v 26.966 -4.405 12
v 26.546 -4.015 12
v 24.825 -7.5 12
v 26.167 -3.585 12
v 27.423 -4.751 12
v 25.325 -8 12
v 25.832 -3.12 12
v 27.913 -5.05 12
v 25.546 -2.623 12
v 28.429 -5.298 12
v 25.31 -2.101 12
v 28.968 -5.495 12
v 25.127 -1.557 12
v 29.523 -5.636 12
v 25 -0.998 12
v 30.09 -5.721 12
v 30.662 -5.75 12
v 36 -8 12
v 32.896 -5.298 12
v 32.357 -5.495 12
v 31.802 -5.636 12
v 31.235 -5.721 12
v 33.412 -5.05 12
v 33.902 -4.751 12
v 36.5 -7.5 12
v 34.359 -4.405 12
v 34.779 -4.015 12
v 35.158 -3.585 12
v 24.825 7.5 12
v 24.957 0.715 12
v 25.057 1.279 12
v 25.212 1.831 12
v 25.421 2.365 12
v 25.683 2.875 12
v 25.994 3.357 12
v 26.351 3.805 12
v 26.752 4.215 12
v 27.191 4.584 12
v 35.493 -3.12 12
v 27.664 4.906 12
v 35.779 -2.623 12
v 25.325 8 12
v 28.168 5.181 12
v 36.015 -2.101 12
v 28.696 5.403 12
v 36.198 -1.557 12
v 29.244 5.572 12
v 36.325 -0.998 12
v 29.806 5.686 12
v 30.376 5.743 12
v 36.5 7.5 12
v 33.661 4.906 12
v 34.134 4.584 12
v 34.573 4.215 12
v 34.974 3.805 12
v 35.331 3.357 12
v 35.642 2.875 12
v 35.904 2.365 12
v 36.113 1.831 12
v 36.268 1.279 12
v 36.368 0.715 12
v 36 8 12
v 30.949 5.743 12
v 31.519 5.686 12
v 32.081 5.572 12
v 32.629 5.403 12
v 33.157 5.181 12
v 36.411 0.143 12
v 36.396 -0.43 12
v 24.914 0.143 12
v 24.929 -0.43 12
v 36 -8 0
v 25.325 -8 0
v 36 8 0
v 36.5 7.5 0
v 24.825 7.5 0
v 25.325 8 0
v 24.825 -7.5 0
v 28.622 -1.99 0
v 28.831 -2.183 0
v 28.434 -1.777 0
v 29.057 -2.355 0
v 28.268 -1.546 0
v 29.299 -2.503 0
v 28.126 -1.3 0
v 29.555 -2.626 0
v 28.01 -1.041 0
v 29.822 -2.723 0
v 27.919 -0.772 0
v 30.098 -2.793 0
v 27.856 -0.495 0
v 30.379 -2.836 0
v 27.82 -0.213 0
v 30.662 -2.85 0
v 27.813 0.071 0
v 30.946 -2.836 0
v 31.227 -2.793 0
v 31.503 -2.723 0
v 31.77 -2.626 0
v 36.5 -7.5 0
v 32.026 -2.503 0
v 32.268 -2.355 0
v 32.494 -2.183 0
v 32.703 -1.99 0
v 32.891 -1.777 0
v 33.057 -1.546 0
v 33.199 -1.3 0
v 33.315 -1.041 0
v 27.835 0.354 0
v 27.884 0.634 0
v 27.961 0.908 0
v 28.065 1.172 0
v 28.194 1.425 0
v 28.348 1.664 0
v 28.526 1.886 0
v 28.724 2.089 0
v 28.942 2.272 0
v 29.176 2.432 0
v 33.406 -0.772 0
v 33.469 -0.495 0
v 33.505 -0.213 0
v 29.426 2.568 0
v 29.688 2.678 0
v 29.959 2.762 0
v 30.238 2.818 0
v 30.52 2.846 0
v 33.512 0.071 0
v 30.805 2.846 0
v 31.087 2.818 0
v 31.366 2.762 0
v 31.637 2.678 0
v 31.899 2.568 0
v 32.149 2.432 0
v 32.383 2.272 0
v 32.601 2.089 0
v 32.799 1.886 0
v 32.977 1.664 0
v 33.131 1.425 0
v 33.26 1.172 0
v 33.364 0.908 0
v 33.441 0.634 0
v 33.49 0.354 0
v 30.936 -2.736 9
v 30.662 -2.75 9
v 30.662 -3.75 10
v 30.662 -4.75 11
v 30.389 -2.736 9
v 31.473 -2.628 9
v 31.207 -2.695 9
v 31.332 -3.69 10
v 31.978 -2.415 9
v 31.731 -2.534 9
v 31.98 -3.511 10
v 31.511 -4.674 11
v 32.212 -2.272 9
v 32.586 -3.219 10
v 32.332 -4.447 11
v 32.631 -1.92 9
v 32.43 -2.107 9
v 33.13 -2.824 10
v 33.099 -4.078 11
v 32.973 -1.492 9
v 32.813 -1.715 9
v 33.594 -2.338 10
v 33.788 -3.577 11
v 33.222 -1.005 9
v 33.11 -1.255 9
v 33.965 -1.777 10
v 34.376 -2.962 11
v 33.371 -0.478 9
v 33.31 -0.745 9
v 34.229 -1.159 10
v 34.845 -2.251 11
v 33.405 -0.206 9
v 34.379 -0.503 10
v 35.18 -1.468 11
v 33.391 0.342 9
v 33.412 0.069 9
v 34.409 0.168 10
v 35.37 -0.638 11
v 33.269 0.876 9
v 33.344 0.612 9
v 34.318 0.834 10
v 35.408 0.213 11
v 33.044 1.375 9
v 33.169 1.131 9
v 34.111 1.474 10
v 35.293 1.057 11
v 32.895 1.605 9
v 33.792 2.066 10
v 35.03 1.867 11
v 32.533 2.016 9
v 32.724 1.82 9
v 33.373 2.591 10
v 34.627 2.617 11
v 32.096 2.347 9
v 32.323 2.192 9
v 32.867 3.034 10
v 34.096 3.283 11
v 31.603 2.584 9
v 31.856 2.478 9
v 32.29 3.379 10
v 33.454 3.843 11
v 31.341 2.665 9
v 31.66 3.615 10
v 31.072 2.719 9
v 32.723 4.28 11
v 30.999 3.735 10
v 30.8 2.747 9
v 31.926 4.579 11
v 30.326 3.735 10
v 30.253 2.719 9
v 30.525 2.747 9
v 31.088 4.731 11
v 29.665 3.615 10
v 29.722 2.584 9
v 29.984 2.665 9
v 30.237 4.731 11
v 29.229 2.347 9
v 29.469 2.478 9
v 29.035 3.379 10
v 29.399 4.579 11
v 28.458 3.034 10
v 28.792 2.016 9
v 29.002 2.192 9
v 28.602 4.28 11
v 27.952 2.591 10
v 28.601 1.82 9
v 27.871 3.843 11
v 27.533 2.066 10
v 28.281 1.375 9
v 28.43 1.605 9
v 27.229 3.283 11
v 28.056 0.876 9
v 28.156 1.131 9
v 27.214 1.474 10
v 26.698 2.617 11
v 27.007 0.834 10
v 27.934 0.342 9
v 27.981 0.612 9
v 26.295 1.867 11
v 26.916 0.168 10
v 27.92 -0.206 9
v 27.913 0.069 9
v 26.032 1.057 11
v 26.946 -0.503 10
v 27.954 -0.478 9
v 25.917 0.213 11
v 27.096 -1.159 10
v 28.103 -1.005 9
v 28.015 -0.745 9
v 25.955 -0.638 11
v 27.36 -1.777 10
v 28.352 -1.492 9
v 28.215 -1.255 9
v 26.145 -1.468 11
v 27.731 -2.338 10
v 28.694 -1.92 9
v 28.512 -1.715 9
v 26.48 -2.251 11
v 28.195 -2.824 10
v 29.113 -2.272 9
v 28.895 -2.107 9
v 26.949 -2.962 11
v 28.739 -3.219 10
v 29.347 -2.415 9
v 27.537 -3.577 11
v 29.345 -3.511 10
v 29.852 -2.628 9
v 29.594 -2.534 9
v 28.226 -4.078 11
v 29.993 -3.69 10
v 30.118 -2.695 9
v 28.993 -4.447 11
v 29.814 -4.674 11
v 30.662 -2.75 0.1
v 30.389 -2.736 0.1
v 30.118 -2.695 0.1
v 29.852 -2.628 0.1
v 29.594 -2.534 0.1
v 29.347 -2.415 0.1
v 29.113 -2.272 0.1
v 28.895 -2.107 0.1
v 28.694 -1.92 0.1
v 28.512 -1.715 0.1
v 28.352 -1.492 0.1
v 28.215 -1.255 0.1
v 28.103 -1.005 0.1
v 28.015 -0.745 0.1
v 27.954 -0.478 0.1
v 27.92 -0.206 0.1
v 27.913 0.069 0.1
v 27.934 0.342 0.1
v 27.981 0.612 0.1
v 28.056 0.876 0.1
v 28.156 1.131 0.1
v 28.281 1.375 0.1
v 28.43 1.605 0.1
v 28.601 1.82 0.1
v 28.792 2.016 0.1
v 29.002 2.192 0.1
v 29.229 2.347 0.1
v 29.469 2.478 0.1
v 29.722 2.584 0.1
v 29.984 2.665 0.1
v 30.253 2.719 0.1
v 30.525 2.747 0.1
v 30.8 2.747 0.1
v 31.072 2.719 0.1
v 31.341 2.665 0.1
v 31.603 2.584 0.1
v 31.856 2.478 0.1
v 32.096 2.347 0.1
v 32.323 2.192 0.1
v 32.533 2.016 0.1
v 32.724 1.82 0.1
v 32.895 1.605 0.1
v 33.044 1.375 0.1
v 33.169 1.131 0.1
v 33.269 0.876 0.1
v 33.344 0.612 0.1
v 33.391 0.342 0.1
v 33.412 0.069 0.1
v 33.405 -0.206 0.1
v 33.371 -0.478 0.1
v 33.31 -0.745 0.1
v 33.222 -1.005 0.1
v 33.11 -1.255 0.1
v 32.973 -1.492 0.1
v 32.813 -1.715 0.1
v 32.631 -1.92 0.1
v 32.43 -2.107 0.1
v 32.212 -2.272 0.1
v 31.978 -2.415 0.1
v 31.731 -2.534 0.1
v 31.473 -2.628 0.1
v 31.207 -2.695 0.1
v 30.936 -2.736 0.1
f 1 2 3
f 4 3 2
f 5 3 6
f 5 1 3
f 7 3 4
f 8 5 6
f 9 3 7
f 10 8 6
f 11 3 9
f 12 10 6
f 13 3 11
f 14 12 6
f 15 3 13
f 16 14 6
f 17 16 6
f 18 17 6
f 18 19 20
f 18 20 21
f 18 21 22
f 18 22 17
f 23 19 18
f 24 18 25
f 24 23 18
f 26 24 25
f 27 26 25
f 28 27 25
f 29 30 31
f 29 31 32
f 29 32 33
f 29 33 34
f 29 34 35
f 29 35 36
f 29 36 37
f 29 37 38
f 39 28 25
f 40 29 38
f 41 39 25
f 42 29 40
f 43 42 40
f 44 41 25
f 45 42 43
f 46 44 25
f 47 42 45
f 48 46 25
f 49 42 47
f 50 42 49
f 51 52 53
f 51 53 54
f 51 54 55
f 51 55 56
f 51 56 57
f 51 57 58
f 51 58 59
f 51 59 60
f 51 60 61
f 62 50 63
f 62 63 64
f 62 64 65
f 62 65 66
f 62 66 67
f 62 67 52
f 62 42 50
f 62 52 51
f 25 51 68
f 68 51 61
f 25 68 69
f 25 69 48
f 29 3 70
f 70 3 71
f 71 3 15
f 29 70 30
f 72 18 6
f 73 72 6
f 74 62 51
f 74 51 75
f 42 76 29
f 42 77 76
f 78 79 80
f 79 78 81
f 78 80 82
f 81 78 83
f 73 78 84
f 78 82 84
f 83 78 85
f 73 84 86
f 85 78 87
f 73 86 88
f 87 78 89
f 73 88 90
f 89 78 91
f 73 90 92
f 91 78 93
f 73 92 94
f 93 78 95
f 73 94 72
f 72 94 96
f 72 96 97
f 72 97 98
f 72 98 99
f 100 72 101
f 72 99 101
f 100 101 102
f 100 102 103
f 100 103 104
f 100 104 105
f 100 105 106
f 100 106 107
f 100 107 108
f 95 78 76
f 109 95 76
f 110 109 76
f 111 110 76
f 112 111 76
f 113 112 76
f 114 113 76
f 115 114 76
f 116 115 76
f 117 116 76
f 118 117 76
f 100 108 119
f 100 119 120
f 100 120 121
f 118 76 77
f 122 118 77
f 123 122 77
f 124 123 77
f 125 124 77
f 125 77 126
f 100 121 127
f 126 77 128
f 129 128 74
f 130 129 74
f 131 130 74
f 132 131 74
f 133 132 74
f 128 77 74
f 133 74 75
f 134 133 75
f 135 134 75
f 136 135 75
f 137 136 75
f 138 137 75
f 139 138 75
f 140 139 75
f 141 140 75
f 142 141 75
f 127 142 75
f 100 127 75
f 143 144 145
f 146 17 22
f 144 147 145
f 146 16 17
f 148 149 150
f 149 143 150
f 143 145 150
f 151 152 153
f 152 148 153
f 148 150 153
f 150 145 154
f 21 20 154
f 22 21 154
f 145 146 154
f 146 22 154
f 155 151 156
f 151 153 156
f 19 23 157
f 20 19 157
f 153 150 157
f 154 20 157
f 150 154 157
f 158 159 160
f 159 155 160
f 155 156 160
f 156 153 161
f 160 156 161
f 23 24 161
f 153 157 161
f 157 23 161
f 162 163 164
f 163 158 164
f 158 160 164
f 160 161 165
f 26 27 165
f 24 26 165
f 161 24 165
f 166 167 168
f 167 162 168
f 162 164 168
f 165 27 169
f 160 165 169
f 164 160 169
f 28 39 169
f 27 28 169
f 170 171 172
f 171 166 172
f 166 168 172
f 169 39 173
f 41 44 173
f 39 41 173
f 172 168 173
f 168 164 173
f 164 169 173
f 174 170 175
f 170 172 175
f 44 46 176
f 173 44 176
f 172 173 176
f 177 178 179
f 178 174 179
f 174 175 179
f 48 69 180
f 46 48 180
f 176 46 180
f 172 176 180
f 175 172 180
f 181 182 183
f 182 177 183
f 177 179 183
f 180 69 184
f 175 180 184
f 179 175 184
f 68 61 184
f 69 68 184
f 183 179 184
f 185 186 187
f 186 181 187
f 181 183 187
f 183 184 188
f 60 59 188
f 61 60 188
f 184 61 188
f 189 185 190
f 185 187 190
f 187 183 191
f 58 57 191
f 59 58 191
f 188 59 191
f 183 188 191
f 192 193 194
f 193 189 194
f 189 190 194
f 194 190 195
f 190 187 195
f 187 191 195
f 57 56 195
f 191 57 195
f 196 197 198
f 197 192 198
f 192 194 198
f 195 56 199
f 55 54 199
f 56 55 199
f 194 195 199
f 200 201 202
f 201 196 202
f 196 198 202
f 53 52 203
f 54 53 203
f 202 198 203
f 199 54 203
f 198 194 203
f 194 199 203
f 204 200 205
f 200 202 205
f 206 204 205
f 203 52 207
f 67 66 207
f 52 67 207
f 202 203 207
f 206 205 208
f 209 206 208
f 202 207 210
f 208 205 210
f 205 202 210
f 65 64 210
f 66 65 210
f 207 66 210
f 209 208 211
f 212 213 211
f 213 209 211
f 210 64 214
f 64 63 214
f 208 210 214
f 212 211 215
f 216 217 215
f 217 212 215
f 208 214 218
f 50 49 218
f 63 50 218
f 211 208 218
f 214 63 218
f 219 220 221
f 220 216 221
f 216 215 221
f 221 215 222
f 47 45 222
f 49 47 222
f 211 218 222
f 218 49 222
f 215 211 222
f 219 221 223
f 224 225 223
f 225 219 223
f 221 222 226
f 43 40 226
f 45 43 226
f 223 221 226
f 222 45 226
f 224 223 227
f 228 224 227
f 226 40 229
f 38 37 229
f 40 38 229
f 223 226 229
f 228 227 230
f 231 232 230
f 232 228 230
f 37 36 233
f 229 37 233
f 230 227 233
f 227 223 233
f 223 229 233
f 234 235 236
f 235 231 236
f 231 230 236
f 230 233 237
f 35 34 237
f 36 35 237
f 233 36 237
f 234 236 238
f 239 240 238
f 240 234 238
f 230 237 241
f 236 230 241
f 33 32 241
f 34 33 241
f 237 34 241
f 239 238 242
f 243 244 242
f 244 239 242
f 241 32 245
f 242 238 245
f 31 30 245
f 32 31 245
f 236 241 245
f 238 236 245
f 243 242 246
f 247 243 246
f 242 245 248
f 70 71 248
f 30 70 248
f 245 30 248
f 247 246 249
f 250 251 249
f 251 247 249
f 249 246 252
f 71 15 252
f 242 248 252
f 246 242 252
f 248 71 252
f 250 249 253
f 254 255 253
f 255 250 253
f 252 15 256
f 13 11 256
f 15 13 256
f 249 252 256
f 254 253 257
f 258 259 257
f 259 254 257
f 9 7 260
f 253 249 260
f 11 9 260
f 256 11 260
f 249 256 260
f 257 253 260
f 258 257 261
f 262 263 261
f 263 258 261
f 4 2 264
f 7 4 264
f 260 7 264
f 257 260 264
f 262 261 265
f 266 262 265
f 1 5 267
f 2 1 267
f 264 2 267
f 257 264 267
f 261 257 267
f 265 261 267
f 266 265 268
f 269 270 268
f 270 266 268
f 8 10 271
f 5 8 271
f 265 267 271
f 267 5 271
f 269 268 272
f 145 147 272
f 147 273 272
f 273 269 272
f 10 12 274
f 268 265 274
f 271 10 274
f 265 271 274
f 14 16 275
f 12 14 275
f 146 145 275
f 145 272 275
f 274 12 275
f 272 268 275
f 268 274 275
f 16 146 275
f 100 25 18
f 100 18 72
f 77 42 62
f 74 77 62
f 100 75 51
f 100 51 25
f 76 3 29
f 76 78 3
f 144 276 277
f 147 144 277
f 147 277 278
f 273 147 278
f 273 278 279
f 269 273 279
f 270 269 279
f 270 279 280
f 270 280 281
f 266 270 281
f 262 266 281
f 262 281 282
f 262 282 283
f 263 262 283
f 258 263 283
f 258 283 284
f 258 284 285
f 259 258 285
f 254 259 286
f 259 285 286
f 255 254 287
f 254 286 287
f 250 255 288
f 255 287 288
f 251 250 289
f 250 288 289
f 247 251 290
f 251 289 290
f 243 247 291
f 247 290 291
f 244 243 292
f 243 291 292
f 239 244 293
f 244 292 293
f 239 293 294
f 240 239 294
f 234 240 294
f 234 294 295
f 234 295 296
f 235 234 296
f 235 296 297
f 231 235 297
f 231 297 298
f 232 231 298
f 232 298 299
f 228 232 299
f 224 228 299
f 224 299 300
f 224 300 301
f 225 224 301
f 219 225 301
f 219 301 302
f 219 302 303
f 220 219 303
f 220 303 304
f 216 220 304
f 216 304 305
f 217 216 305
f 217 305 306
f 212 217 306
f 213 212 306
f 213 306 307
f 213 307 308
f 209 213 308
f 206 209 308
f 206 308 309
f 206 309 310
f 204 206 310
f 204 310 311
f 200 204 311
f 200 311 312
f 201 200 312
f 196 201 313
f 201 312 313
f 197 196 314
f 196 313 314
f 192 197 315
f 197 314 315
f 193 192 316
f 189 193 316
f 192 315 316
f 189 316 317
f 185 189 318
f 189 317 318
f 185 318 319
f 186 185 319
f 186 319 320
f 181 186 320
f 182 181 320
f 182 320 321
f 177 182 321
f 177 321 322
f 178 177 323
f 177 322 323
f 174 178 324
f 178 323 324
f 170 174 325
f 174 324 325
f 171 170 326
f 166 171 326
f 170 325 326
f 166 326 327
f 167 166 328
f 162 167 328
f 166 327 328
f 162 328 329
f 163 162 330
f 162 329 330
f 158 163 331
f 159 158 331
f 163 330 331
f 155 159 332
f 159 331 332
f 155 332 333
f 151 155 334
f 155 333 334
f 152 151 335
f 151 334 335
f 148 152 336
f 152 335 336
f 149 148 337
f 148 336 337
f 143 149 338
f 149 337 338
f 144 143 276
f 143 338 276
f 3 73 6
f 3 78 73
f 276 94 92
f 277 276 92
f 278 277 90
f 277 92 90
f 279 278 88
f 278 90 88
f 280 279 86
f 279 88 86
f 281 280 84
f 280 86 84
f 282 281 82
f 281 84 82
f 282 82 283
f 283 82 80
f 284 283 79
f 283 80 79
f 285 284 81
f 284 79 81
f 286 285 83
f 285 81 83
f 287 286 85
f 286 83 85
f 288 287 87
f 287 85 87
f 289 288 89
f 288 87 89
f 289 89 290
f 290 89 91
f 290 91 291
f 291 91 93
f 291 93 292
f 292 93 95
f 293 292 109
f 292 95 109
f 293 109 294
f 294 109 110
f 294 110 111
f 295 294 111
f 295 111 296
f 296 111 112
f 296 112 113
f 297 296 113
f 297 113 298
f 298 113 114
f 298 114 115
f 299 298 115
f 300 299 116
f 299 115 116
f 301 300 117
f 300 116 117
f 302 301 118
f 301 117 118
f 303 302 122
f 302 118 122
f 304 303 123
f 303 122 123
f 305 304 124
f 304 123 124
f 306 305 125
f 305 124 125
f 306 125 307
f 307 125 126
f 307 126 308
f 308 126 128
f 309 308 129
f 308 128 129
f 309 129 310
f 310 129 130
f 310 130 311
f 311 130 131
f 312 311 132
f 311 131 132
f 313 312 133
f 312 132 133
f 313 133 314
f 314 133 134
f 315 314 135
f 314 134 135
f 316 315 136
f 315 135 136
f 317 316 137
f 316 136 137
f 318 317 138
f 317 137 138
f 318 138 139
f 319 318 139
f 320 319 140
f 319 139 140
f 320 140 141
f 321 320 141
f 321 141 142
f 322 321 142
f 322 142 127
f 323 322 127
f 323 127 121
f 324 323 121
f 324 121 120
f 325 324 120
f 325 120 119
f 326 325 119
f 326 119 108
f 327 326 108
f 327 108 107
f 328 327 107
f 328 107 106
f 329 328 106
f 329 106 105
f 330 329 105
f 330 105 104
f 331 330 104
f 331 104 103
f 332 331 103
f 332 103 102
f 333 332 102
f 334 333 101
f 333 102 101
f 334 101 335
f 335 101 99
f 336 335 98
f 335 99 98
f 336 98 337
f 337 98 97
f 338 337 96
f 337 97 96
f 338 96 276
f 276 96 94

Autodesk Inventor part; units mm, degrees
ref_plane "YZ Plane" through (0, 0, 0) normal (1, 0, 0) x (0, 1, 0)
ref_plane "XZ Plane" through (0, 0, 0) normal (0, 1, 0) x (-1, 0, 0)
ref_plane "XY Plane" through (0, 0, 0) normal (0, 0, 1) x (1, 0, 0)
sketch "Sketch1" plane through (0, 0, 0) normal (0, 0, 1) x (1, 0, 0)
  line L0 (23.825, 8.05) -> (23.825, -8.05) construction
  line L1 (37, 8) -> (31.3548, 8) construction
  line L2 (31.3548, -8) -> (37, -8) construction
  line L3 (37, 8) -> (23.825, 8) construction
  line L4 (23.825, 8) -> (23.825, -8) construction
  line L5 (23.825, -8) -> (37, -8) construction
  line L6 (37, -8) -> (37, 8) construction
  circle A0 centre (30.6625, 0) radius 2.067 construction
  line L7 (36.5, -8) -> (24.825, -8)
  line L8 (24.825, -8) -> (24.825, 8)
  line L9 (24.825, 8) -> (36.5, 8)
  line L10 (36.5, 8) -> (36.5, -8)
  line L11 (36.5, -8) -> (24.825, 8) construction
  line L12 (24.825, -8) -> (36.5, 8) construction
  point P0 (0, 0)
  dimension "d0" = 1
  dimension "d1" = 0
  dimension "d11" = 11.675
  dimension "d12" = 16
extrude "Extrusion1" add sketch "Sketch1" along normal blind 12
sketch "Sketch2" plane through (0, 0, 12) normal (0, 0, 1) x (1, 0, 0)
  point P0 (0, 0)
  point P1 (30.6625, 0)
hole "Hole1" at (30.6625, 0, 12) direction (0, 0, -1) diameter 5.5 end through all countersink diameter 11.5 countersink angle 90 clearance for "Countersunk Flat Head Screw ISO 2009/7046" size "M5" standard "ISO"
chamfer "Chamfer1" distance 0.5 angle 45 4 edges at (24.825, -8, 6) (24.825, 8, 6) (36.5, 8, 6) (36.5, -8, 6)
chamfer "Chamfer2" distance 0.1 angle 45 1 edges at (30.6625, 2.75, 0)
properties part number "TH1-002" material "Steel, Mild"
